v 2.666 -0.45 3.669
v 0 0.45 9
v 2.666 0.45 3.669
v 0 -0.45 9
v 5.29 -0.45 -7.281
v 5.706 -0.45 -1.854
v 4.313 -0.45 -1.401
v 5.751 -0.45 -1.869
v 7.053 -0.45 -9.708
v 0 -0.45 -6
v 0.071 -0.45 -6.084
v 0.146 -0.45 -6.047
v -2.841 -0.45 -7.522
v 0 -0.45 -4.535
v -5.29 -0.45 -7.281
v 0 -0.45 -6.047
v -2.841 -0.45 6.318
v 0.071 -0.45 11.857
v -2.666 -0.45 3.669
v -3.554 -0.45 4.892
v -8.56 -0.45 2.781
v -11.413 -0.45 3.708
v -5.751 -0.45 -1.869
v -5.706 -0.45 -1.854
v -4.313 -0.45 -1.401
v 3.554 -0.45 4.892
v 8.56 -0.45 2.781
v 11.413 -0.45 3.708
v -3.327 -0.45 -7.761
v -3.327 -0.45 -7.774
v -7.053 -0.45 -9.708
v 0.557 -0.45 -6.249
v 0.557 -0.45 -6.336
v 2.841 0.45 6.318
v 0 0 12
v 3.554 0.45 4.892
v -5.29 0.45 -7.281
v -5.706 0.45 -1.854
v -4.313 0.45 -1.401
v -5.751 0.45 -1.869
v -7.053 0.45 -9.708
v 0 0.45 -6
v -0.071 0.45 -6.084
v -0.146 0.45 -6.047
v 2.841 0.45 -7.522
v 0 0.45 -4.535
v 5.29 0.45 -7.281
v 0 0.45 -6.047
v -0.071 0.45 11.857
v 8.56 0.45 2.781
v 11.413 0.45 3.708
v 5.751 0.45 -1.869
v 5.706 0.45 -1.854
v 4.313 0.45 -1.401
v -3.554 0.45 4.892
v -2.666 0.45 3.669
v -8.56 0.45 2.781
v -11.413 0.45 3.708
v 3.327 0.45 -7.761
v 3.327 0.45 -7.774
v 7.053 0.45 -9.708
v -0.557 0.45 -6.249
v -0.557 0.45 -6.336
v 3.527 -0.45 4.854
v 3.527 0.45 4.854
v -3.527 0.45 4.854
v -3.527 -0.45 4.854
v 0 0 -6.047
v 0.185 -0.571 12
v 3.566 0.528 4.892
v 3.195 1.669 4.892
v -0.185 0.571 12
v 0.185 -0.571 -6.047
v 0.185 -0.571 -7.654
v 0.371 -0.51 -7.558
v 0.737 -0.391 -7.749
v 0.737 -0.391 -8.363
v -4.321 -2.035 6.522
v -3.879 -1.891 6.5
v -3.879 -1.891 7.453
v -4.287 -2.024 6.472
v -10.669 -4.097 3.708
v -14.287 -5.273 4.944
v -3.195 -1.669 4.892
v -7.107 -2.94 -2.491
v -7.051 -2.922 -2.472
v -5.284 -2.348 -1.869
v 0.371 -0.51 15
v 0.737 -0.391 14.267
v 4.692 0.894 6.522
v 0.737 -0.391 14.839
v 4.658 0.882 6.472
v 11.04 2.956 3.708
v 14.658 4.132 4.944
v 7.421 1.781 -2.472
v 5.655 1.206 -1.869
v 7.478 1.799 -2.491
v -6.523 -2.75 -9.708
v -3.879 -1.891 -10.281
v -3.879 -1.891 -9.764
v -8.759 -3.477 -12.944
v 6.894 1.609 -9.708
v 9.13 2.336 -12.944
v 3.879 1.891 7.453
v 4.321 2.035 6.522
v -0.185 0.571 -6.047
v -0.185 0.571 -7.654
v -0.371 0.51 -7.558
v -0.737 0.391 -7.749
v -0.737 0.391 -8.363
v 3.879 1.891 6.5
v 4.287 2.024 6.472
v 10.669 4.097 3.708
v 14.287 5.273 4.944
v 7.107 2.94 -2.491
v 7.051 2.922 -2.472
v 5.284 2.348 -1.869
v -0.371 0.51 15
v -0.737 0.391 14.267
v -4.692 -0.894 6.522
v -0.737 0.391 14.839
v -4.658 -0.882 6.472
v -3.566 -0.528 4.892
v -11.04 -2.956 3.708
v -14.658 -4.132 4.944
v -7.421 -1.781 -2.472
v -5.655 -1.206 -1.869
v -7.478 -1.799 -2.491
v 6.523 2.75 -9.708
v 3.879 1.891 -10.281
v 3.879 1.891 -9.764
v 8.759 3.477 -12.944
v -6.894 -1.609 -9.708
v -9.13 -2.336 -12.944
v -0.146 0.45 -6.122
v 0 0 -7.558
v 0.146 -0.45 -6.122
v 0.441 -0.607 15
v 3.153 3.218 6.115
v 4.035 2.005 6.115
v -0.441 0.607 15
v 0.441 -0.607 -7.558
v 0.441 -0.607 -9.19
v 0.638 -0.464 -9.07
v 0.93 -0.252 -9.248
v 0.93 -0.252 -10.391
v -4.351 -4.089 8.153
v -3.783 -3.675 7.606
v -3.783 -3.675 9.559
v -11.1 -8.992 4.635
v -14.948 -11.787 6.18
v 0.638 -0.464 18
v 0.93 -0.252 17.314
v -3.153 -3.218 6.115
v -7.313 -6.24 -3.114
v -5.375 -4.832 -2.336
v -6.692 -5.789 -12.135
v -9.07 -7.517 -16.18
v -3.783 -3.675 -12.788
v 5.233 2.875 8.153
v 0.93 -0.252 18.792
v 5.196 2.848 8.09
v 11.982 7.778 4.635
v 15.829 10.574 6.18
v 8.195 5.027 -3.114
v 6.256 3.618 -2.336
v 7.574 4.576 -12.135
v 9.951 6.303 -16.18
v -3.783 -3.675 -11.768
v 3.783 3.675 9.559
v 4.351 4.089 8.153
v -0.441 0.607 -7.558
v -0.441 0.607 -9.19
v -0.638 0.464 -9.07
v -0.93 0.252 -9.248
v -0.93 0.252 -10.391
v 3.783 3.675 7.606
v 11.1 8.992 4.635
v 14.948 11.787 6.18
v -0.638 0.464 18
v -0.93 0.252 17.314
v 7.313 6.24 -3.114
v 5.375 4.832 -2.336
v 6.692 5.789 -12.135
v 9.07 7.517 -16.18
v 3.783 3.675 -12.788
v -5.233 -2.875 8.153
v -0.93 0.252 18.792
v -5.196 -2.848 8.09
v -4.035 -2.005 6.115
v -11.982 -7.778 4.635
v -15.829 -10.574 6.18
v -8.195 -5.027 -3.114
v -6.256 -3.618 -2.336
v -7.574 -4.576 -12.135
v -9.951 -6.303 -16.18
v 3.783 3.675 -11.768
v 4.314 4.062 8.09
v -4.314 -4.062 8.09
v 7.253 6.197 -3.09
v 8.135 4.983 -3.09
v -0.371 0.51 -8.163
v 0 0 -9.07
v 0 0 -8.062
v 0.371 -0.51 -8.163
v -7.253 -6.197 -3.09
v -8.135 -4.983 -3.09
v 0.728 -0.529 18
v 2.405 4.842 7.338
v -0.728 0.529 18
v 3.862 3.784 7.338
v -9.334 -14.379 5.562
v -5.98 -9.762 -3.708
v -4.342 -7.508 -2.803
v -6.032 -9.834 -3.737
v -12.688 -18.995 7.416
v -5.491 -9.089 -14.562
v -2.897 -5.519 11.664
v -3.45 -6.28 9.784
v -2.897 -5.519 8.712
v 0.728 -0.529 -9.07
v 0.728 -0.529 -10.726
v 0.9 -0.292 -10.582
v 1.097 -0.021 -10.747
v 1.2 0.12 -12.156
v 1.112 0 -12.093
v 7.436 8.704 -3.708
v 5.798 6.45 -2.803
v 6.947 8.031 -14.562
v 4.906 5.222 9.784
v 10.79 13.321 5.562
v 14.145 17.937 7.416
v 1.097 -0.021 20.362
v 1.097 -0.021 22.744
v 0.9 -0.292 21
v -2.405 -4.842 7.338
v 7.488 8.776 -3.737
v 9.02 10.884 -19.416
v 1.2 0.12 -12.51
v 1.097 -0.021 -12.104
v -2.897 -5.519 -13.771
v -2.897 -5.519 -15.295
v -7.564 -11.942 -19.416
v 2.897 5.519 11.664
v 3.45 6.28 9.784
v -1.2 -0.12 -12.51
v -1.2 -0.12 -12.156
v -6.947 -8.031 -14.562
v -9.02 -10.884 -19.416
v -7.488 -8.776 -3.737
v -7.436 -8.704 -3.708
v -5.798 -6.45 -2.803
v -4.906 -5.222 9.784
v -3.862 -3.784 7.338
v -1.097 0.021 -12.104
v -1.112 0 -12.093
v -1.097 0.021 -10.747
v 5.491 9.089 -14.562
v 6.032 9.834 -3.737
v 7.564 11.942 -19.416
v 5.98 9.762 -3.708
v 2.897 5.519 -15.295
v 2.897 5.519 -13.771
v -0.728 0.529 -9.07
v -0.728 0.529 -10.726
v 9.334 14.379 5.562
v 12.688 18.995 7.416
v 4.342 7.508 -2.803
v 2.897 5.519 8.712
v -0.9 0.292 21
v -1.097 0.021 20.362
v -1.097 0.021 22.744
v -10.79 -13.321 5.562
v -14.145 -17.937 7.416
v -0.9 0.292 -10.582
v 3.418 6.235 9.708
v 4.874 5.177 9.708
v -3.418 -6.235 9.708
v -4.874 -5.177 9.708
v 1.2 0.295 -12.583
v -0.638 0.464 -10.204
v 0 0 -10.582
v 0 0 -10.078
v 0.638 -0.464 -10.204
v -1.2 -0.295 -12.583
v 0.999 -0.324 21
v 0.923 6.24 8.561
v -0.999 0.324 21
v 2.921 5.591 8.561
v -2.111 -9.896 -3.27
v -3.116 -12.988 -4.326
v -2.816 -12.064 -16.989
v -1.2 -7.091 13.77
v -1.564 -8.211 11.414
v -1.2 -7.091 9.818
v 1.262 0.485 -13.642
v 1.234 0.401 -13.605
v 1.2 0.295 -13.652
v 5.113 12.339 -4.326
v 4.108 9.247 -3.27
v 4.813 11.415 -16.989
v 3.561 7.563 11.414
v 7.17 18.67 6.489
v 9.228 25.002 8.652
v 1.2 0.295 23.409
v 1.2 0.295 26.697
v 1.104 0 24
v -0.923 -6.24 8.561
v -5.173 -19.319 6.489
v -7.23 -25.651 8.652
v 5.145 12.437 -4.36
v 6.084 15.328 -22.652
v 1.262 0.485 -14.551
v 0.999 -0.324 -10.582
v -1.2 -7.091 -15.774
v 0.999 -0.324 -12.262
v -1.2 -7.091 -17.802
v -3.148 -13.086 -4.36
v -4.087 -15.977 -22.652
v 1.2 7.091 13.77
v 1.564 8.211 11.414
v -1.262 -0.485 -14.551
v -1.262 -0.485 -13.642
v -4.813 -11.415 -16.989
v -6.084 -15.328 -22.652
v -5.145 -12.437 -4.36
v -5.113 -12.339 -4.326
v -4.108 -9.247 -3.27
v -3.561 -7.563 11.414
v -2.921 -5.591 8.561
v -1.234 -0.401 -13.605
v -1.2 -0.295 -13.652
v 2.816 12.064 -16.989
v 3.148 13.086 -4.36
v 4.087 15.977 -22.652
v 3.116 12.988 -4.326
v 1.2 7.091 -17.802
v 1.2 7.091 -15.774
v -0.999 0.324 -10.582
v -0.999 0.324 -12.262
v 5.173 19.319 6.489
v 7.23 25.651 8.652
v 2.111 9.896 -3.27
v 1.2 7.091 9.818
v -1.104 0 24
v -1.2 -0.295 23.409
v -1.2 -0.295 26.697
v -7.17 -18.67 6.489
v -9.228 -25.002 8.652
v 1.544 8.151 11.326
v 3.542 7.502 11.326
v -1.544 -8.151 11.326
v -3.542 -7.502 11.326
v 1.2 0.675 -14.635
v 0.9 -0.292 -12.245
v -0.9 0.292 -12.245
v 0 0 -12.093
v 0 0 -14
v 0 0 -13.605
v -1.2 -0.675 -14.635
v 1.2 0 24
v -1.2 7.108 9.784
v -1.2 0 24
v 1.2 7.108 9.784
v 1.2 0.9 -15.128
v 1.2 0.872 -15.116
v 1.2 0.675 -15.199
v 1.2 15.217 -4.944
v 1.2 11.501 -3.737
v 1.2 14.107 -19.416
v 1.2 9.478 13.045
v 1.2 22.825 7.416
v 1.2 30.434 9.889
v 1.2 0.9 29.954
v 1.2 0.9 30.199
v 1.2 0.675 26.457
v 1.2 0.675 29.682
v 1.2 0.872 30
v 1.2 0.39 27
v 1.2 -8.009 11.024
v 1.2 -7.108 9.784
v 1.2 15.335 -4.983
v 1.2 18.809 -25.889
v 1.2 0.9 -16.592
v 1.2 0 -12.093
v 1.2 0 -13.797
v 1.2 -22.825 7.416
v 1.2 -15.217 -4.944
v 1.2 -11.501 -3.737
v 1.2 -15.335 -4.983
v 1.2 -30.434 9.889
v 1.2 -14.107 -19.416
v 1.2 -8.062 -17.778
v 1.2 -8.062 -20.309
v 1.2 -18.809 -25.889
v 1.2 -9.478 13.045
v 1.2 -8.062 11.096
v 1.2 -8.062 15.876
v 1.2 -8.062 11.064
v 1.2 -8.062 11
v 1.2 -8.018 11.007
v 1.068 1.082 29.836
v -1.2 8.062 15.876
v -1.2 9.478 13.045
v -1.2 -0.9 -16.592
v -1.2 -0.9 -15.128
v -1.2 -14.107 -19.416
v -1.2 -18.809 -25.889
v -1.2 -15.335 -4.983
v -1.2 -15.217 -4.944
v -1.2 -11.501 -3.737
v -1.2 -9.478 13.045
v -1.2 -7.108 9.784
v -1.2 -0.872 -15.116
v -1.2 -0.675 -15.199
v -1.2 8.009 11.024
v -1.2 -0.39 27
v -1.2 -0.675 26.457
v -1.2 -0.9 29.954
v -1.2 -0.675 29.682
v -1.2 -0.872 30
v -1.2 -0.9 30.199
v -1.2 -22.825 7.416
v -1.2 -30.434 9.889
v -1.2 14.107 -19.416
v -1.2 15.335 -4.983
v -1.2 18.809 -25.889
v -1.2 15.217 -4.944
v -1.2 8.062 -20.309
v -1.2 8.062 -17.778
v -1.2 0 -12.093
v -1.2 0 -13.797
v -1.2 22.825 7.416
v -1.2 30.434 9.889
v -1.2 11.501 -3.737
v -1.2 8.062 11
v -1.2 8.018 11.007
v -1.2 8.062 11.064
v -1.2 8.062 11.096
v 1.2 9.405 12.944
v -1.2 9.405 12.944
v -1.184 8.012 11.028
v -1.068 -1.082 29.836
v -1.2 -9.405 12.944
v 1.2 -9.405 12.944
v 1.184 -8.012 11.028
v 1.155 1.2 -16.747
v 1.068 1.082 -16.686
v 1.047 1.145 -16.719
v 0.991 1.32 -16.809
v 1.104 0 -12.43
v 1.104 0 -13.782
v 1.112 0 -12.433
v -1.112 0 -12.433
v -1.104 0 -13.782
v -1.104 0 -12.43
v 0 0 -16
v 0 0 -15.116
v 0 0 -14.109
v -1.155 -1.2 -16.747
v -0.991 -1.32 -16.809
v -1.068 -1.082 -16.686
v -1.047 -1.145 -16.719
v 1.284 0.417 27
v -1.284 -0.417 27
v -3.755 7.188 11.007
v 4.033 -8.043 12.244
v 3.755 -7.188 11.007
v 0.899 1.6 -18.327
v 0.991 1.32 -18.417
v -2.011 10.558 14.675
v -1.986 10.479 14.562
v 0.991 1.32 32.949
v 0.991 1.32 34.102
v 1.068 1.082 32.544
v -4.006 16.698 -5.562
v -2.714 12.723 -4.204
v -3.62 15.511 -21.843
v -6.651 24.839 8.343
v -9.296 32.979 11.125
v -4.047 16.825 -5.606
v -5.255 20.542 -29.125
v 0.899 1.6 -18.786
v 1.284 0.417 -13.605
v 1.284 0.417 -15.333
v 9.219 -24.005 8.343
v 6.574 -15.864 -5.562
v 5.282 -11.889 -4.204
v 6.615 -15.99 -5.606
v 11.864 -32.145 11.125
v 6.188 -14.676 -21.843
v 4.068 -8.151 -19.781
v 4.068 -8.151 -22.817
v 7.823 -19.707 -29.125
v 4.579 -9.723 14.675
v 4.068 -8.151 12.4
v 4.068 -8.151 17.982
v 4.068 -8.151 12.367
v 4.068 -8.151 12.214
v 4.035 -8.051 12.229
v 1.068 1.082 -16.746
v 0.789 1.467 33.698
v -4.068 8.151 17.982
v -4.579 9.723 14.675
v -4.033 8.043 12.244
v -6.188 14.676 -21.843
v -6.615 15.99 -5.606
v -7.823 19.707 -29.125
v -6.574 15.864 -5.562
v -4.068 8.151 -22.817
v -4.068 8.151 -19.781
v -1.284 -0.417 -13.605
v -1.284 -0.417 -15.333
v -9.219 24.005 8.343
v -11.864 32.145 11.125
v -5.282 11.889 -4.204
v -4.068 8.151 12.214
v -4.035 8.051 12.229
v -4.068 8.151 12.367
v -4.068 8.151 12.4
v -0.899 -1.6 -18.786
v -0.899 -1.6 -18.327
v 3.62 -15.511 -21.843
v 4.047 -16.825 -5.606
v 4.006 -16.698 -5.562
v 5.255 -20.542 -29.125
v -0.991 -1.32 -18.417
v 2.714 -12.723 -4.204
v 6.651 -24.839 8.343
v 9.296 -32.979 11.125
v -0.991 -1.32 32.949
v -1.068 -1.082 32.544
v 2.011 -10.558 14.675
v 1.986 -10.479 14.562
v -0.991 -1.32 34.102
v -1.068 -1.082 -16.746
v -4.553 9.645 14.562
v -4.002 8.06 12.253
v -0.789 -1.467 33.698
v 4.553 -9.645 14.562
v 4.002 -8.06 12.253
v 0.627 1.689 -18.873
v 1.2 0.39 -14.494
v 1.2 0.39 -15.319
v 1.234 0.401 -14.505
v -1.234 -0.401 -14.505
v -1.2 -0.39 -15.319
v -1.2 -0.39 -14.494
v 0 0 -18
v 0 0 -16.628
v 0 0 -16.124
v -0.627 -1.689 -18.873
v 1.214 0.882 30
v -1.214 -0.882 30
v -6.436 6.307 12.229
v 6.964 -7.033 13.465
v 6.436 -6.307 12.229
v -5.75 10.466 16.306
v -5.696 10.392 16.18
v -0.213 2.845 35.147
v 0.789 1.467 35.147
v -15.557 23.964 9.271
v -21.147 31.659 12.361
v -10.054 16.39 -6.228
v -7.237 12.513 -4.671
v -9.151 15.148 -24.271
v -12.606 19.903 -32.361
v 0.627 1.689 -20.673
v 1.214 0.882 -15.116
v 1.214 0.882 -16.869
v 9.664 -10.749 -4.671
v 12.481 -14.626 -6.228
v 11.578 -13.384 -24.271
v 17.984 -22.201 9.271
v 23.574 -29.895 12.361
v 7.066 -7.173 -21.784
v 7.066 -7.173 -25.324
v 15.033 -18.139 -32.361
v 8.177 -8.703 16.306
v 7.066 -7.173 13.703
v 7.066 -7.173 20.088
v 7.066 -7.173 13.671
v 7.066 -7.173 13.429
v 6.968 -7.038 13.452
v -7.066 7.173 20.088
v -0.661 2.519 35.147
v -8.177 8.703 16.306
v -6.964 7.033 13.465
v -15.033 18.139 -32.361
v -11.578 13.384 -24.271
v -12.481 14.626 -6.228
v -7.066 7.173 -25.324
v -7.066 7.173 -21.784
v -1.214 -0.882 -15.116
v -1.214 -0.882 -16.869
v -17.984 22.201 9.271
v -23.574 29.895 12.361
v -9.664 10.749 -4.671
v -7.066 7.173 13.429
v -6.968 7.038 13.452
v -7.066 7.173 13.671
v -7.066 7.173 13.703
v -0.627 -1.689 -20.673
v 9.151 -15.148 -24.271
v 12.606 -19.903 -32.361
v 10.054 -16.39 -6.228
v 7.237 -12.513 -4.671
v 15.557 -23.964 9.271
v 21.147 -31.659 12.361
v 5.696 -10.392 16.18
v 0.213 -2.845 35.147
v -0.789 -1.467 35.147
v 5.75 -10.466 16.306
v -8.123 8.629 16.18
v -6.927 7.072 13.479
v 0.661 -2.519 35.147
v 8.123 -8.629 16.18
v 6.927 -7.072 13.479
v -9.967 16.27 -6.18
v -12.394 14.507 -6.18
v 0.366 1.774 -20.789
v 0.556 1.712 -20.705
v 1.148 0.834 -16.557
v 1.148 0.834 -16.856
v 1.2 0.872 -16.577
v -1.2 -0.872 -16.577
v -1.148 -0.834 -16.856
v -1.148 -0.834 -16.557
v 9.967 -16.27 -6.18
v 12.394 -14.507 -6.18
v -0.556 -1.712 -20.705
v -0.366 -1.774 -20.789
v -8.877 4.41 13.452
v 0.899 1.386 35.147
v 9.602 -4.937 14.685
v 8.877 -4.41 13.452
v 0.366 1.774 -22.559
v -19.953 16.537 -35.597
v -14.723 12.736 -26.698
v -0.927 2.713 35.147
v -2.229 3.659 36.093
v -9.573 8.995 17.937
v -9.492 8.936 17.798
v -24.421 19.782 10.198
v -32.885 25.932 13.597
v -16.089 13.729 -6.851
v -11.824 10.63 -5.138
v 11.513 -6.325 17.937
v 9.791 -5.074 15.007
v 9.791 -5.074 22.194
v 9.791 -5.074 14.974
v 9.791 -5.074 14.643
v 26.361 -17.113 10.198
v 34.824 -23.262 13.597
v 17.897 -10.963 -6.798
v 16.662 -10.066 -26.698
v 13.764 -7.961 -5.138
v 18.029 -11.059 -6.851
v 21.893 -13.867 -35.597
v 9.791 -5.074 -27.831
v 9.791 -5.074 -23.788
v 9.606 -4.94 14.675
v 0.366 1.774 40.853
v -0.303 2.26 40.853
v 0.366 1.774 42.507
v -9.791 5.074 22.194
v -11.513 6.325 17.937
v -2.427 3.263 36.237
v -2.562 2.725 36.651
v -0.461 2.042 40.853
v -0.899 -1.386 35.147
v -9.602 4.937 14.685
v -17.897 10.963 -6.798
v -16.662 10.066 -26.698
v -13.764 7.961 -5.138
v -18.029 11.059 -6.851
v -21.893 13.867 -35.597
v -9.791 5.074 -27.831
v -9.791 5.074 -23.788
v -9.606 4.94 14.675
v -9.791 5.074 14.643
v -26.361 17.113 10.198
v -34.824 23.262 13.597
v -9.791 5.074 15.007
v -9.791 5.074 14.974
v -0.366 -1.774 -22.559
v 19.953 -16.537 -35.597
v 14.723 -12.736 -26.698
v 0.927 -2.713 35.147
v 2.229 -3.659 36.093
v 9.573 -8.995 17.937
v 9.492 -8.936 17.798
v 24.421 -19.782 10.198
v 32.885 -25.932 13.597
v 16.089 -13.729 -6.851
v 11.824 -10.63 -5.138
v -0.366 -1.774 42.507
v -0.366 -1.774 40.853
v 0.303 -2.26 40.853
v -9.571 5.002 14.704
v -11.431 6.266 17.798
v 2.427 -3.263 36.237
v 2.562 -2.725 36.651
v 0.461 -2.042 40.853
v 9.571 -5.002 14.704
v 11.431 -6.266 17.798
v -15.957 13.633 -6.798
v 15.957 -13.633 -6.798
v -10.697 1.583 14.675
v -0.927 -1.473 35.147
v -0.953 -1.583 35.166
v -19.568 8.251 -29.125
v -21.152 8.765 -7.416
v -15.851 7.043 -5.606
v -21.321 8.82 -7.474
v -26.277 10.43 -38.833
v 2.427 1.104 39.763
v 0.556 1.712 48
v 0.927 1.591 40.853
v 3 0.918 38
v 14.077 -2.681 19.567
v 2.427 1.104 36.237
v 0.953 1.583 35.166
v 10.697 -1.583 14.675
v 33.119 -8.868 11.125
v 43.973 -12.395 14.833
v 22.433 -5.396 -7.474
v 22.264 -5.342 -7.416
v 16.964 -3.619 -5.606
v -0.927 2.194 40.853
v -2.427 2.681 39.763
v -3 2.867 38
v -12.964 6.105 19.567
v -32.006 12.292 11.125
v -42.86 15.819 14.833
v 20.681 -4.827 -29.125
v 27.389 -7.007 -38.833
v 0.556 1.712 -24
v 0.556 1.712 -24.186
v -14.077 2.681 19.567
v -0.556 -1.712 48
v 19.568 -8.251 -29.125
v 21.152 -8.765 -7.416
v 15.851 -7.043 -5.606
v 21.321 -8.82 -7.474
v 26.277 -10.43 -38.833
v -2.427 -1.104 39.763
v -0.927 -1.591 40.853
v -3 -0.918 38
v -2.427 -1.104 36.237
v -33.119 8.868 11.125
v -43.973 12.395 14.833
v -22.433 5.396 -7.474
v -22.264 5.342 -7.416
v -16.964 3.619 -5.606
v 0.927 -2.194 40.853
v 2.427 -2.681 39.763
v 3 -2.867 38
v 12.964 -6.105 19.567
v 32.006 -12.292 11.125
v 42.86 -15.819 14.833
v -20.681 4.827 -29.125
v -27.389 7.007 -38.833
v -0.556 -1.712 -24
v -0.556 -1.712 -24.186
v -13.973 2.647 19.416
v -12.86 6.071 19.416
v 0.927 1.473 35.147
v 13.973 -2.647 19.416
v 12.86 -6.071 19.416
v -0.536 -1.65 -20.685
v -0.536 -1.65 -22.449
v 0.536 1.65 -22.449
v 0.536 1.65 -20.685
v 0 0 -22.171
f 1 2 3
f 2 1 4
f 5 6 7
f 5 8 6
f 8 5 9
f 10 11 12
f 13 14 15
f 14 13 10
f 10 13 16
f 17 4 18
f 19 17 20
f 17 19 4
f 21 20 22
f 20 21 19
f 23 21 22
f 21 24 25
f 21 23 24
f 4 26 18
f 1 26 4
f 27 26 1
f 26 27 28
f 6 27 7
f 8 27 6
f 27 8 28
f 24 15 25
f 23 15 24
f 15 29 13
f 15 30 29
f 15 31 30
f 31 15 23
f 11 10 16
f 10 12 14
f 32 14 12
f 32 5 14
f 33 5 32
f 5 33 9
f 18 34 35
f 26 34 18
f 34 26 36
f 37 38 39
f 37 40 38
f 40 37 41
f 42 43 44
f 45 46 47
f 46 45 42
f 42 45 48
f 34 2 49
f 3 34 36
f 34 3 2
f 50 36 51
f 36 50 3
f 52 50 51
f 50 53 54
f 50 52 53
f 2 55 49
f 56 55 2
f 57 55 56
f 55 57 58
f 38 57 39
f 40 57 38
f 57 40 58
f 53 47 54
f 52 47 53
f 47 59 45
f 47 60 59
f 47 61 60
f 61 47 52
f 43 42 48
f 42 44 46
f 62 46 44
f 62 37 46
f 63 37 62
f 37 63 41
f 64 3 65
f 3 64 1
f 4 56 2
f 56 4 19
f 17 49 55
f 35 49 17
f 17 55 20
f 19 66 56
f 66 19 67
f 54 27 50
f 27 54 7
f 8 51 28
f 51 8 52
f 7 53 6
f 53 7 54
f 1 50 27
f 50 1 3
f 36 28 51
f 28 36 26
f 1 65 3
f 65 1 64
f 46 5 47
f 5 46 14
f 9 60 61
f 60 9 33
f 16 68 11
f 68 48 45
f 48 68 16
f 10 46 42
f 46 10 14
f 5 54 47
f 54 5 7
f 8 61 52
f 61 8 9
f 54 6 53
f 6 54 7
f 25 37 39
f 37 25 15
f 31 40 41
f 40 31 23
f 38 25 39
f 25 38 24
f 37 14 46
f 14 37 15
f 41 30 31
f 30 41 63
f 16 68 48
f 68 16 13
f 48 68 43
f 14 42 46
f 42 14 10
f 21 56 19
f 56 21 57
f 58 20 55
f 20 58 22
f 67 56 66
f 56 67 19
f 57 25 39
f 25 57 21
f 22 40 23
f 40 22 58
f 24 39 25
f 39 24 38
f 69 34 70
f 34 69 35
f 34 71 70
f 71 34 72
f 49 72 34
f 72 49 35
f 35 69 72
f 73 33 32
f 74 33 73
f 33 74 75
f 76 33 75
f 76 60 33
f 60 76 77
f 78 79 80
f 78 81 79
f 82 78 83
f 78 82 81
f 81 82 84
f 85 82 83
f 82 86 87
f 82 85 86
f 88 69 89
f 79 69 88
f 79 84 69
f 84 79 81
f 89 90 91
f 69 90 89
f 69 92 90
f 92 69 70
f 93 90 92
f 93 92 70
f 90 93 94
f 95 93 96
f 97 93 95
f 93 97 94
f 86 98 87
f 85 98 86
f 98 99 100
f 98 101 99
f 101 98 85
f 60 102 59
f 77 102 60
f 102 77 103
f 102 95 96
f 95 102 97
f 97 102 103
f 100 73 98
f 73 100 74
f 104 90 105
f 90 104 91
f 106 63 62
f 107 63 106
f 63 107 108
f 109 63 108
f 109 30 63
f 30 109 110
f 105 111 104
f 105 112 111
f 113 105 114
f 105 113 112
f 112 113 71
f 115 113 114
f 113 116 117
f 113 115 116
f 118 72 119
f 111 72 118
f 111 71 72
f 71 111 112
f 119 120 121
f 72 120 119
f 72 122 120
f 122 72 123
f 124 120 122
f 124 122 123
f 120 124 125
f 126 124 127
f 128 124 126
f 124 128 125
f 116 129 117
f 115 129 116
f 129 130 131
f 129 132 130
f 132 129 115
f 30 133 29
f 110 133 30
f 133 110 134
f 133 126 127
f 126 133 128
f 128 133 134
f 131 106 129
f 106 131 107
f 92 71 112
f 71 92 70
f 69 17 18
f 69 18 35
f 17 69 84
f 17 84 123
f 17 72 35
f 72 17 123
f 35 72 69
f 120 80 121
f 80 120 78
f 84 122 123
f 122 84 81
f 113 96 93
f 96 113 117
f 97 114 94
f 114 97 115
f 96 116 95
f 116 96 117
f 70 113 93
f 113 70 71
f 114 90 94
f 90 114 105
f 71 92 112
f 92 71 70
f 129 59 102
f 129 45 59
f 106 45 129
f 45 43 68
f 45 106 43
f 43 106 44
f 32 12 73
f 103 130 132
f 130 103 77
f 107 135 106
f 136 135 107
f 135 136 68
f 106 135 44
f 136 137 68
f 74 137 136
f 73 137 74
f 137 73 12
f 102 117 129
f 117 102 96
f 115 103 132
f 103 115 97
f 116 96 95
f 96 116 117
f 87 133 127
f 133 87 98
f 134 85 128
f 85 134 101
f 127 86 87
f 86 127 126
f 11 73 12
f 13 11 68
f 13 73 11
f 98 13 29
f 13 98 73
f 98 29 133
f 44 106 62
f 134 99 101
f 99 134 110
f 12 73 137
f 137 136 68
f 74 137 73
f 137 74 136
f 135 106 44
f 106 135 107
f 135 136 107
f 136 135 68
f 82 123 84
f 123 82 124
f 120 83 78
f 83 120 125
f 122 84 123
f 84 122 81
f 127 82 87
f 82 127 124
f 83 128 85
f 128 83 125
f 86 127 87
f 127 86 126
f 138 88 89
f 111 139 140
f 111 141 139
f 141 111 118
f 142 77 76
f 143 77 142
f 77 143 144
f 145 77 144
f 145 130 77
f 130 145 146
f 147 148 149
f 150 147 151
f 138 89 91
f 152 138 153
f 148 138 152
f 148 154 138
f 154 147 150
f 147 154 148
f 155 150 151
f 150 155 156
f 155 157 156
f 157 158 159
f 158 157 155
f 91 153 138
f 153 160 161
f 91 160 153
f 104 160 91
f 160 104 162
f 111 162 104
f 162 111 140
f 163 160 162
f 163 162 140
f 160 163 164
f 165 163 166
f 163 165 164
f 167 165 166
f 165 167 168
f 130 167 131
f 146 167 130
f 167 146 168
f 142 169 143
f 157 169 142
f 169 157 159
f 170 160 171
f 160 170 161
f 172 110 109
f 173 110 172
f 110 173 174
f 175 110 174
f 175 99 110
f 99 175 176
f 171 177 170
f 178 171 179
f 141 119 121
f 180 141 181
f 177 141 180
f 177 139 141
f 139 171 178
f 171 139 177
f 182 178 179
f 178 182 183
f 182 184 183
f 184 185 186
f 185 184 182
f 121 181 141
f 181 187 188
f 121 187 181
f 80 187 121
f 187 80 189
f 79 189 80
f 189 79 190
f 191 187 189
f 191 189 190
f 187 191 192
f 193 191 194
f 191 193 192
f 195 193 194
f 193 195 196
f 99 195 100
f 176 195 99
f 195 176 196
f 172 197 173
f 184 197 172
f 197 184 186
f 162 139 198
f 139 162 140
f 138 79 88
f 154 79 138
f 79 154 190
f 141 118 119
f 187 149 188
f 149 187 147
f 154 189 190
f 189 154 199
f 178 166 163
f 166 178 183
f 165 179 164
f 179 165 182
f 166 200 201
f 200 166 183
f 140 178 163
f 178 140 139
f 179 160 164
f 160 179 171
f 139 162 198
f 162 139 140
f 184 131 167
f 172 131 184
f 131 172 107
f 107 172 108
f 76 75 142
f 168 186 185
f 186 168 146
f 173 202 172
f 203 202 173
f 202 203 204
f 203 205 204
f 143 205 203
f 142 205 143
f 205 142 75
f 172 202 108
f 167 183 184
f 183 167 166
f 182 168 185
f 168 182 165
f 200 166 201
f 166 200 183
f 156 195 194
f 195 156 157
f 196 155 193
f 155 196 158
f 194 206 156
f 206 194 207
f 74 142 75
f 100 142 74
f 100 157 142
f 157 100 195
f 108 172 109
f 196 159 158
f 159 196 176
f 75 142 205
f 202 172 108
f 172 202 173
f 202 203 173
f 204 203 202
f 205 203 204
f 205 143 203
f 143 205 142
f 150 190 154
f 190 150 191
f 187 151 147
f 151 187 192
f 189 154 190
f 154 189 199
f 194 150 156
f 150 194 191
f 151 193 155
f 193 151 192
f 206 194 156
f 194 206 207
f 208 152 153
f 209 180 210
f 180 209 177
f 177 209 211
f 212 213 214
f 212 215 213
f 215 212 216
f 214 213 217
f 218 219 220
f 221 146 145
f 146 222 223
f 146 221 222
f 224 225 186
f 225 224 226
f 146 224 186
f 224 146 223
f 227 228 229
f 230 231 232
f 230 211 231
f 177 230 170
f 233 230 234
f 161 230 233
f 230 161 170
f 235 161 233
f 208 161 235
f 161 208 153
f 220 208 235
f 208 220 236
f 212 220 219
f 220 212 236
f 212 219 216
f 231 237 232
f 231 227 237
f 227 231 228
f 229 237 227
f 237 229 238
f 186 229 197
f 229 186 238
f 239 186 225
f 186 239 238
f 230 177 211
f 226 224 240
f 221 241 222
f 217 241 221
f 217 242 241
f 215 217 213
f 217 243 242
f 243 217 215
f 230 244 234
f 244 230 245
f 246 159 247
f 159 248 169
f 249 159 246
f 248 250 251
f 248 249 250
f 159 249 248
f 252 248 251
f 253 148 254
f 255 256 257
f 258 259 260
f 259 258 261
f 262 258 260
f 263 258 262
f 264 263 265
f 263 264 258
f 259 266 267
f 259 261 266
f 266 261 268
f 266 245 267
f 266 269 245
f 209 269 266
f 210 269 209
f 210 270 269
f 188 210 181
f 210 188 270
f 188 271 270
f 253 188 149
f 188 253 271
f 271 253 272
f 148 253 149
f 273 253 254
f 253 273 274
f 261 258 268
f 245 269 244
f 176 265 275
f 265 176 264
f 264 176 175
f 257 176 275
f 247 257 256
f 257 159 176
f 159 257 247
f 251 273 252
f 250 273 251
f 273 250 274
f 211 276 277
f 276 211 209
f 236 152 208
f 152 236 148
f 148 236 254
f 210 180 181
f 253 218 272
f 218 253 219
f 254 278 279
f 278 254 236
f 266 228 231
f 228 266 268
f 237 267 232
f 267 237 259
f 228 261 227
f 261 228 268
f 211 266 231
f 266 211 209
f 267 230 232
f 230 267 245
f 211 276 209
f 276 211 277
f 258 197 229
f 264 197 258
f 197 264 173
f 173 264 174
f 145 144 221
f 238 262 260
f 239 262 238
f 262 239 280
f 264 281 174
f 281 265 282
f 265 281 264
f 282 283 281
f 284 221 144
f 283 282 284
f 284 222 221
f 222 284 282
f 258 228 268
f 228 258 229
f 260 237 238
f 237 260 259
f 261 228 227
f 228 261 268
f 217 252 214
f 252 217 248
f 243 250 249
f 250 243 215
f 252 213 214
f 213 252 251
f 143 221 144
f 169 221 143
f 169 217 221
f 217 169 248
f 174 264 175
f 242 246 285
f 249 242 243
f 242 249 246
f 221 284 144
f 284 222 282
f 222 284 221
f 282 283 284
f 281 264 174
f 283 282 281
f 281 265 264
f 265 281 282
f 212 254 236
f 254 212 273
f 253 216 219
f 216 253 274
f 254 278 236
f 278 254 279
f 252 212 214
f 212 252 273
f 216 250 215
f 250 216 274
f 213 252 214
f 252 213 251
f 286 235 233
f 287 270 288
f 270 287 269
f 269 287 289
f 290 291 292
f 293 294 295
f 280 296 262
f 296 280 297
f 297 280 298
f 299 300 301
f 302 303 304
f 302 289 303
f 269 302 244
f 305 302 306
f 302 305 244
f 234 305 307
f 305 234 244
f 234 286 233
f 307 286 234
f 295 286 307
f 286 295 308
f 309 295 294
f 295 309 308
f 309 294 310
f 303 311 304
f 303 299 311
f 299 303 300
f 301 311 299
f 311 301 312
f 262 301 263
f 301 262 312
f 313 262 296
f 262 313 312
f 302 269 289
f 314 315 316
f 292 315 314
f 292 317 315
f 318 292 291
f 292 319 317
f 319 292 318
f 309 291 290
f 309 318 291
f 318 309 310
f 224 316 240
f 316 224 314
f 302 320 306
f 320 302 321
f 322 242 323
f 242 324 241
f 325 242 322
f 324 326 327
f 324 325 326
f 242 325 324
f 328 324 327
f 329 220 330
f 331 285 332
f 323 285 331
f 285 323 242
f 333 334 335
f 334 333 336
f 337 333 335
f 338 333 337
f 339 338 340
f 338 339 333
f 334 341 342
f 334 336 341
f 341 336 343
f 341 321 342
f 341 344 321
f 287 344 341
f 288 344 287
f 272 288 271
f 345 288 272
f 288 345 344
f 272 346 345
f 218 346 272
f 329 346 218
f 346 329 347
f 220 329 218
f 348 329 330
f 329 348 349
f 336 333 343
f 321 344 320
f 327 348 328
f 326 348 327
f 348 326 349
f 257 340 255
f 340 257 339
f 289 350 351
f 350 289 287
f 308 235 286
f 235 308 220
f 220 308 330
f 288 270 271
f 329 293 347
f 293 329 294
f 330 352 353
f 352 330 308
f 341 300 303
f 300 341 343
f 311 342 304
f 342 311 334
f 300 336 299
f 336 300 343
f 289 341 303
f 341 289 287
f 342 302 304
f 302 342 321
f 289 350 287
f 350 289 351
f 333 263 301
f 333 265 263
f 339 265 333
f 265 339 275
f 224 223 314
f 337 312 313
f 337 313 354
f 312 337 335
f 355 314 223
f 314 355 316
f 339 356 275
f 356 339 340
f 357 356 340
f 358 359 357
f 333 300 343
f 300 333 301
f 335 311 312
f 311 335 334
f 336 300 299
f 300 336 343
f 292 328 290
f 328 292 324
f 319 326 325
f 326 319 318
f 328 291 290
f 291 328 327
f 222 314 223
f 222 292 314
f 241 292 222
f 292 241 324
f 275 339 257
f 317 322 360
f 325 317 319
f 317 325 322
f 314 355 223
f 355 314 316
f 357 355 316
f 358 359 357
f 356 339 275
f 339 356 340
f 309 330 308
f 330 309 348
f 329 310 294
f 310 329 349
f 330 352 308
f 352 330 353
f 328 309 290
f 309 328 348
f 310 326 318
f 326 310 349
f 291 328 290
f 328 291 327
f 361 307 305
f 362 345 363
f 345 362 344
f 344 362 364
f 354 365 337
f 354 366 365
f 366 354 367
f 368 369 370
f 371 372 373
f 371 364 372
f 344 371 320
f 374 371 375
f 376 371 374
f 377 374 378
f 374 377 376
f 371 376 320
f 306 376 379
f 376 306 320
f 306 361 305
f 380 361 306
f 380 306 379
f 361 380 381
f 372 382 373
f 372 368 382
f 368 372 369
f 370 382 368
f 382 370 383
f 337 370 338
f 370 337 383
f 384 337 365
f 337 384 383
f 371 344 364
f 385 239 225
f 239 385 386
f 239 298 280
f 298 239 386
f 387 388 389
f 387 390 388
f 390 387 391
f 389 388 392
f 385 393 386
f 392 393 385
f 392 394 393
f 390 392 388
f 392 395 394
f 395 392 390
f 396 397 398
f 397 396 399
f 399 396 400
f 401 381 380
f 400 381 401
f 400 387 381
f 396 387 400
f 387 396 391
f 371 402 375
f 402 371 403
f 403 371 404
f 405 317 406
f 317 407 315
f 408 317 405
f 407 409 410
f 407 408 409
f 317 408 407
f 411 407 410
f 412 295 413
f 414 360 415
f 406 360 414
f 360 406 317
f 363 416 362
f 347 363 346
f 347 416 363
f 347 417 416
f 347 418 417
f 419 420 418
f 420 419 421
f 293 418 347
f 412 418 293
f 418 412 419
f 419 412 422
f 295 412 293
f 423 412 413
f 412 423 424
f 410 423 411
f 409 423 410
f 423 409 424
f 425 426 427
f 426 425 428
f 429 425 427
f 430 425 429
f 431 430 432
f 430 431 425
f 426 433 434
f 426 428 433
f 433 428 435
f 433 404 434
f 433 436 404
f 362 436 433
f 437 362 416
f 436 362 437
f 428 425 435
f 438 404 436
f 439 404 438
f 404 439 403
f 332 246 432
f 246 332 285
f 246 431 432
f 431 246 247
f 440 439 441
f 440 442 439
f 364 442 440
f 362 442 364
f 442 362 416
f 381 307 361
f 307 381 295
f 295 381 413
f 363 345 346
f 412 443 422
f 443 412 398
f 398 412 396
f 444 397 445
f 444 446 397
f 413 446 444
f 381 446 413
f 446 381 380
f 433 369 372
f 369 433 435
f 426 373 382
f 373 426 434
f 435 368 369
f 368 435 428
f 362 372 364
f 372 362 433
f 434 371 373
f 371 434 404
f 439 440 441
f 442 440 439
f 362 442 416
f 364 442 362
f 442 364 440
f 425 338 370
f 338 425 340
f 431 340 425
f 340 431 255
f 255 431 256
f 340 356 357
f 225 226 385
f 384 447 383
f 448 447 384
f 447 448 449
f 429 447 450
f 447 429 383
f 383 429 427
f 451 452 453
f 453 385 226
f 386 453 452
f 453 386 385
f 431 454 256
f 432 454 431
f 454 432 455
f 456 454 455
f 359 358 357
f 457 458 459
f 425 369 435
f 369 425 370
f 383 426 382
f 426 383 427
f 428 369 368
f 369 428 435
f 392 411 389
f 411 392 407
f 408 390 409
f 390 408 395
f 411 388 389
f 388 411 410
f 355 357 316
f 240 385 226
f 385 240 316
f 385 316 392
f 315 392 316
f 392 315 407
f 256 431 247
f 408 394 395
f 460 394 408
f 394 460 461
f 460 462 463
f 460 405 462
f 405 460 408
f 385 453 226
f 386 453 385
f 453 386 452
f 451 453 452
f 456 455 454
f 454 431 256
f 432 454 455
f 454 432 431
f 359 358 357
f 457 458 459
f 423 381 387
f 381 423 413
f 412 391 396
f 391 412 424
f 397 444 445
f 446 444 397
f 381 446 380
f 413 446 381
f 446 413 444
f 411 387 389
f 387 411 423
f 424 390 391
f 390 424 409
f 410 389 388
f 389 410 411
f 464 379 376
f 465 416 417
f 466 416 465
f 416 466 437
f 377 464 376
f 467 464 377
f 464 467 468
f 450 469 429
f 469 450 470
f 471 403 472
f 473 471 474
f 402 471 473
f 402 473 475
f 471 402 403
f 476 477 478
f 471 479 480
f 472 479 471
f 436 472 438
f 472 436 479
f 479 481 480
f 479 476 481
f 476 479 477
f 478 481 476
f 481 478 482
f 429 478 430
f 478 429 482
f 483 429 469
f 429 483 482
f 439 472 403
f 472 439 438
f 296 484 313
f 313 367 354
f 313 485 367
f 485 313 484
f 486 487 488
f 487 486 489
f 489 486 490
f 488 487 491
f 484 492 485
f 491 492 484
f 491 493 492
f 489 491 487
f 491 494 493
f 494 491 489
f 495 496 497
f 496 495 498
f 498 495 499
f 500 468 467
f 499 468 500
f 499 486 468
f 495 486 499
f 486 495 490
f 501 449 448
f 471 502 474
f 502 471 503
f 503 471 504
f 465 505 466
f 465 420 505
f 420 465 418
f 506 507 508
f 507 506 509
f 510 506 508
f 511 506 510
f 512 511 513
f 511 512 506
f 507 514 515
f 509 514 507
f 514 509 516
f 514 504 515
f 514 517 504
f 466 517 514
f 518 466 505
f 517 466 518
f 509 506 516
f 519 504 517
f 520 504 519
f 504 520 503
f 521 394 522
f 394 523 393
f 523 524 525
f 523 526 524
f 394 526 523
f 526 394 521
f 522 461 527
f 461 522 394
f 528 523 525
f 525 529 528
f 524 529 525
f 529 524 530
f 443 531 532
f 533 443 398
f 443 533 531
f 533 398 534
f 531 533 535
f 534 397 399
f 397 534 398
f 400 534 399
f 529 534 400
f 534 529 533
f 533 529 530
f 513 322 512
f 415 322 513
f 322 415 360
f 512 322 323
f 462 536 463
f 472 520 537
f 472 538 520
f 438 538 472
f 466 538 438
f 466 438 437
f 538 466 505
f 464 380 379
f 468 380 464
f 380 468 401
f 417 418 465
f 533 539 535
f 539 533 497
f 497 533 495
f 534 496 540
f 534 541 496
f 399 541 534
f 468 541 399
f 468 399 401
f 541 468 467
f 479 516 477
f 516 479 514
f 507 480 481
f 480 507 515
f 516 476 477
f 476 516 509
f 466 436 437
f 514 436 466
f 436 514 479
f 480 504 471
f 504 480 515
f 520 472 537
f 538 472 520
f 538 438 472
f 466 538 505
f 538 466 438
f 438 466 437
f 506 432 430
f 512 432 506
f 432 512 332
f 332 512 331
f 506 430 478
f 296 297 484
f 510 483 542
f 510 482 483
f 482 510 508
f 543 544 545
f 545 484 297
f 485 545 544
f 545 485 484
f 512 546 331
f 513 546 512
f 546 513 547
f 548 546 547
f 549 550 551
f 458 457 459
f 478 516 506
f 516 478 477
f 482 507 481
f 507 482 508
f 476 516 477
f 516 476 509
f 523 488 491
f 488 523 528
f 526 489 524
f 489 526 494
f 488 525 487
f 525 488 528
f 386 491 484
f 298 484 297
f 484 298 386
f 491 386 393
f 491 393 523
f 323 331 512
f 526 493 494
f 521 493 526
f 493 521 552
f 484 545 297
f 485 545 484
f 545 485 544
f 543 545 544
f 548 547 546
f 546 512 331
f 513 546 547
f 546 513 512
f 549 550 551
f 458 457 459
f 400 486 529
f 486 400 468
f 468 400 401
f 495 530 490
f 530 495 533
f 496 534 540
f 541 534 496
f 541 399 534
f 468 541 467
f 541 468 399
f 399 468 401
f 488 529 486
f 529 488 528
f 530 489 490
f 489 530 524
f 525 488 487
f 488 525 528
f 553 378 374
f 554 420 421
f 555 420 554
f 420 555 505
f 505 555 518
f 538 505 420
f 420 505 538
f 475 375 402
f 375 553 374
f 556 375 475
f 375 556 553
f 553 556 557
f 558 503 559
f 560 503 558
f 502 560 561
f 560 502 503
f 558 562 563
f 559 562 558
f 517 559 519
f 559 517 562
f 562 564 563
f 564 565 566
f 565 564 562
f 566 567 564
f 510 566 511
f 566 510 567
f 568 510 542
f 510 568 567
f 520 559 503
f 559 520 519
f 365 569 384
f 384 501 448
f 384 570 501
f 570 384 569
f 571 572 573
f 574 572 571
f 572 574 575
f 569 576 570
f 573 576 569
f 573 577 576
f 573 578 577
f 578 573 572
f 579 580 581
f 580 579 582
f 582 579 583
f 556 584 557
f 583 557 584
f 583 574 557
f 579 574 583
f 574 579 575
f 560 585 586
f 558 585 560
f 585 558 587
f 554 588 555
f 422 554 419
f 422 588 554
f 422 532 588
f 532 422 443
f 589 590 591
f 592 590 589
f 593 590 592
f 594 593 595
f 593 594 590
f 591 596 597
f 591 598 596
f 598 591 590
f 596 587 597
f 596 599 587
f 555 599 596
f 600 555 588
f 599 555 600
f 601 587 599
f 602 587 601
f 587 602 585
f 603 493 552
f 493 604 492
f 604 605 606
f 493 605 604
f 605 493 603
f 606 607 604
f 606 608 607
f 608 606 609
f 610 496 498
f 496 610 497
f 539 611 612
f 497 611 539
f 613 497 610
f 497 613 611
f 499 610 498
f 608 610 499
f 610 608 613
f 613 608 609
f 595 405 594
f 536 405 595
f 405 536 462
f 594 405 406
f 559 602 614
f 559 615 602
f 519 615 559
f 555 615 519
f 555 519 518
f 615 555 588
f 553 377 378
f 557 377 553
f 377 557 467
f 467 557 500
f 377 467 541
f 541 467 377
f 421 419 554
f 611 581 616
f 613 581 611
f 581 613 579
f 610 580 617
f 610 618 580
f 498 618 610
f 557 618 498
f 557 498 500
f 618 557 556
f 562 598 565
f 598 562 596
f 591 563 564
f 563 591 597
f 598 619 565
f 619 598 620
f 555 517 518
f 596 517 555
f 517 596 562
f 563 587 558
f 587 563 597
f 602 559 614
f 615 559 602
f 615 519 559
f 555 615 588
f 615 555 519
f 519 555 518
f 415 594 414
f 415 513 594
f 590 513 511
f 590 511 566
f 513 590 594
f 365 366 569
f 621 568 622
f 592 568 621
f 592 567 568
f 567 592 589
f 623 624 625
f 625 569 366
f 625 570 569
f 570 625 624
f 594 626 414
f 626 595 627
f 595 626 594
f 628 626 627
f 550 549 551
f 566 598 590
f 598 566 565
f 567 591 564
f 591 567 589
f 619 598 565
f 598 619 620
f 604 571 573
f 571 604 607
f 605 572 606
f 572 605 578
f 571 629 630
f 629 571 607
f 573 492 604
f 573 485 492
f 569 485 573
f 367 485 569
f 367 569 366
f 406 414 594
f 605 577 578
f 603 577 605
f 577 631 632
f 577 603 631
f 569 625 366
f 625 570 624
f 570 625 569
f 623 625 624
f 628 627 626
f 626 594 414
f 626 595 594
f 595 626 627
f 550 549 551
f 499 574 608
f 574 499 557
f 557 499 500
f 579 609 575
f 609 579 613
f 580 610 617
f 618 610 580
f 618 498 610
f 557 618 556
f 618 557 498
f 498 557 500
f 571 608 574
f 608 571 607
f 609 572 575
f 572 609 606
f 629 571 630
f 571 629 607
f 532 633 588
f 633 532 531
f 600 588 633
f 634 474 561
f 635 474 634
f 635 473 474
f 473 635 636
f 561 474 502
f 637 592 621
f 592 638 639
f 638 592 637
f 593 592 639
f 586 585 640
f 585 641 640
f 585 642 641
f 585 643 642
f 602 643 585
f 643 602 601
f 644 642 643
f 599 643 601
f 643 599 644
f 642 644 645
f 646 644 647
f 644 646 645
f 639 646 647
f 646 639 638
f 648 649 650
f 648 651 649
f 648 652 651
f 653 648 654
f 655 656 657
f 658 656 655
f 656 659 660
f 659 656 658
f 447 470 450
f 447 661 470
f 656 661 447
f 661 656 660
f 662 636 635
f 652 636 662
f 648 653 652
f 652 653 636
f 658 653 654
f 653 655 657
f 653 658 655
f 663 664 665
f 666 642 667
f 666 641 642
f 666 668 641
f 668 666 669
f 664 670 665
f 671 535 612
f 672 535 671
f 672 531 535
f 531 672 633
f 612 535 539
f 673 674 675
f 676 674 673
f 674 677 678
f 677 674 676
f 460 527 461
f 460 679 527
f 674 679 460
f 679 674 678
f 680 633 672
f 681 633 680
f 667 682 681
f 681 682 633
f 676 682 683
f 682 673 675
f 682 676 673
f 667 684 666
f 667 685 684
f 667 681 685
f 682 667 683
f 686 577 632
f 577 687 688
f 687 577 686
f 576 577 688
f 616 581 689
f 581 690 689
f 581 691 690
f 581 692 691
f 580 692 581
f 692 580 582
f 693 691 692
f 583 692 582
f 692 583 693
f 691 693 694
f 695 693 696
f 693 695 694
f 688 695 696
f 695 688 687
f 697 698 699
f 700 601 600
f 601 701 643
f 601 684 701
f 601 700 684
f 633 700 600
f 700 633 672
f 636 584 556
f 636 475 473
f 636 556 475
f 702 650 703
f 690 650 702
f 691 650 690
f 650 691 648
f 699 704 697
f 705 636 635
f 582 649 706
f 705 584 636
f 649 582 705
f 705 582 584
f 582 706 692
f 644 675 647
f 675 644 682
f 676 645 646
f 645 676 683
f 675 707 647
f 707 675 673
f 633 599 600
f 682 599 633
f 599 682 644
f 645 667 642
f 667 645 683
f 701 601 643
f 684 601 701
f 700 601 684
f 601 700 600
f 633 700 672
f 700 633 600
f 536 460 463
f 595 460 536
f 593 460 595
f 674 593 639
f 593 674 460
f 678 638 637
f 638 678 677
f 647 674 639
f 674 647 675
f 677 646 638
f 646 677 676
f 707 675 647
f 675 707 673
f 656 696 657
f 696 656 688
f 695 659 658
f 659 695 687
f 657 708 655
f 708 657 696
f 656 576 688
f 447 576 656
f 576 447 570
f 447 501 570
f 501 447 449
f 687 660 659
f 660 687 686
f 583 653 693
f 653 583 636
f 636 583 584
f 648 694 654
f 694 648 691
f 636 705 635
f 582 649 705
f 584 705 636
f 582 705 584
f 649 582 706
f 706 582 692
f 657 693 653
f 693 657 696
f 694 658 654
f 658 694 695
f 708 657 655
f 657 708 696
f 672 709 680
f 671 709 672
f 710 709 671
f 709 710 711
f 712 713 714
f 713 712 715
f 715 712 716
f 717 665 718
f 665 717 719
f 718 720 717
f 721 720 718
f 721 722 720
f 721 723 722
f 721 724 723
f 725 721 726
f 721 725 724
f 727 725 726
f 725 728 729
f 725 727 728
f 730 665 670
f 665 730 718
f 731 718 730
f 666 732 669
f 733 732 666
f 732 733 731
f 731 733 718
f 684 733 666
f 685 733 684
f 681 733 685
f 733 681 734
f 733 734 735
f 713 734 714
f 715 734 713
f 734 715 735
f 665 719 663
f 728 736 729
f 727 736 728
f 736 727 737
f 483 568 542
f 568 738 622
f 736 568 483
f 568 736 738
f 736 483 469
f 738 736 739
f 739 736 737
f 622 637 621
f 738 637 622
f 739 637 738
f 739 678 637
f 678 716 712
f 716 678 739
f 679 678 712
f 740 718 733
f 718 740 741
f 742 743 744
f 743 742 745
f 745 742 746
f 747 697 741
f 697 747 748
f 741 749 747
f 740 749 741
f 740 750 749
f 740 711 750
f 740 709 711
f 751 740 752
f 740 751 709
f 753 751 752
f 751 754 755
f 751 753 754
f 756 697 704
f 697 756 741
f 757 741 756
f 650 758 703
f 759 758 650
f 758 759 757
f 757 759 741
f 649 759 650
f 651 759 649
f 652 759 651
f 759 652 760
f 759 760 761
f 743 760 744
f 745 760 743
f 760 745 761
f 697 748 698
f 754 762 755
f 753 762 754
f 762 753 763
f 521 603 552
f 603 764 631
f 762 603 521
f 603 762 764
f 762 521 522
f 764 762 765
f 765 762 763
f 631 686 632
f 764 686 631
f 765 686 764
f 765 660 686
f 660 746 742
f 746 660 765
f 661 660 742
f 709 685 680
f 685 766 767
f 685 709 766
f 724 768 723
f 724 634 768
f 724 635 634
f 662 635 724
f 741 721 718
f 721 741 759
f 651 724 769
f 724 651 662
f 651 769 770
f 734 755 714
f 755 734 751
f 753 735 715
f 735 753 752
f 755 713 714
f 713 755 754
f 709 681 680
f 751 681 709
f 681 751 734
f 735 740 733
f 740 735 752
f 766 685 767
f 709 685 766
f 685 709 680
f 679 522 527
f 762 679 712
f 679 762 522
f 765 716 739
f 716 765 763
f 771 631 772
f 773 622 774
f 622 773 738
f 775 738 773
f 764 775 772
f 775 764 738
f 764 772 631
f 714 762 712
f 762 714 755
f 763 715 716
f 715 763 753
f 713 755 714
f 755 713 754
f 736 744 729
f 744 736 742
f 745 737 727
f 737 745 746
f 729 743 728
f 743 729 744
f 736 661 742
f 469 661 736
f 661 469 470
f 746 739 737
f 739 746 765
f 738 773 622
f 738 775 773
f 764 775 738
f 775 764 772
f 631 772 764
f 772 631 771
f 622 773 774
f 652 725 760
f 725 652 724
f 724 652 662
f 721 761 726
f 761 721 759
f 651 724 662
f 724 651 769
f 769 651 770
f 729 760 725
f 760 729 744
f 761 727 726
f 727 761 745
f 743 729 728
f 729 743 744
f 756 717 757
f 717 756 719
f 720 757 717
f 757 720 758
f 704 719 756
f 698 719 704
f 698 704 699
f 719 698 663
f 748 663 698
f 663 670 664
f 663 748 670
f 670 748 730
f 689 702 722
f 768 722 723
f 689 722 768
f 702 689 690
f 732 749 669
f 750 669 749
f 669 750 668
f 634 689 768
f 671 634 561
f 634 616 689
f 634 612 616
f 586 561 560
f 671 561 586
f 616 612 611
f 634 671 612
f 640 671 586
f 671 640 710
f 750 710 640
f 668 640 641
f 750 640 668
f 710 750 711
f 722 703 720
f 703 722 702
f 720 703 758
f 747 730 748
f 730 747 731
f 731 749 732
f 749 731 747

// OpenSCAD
module baseline(n) {
    difference() {
        rotate([90,0,0])
        linear_extrude(height = 3, center=true)
        polygon(points=[[0,30],[0,40],[20,0],[20,-10]]);
        translate([0,-2.5,0])
        rotate([0,360/n/2,0])        
        cube([30,5,20]);
    }
}

module tip(n) {
    union() {
        baseline(n);
        mirror([1,0,0])
            baseline(n);
    }
}

module star() {
n = 5;
for(i=[0:n-1]) {
    rotate([0,i*360/n,0])
        tip(n);
}
}

difference() {
    union(){
        m = 10;
        for(i=[0:m-1]) {
            rotate([0,0,i*180/m])
            scale([i/m+.3,i/m+.3,i/m+.3])
                star();
        }
    }
    translate([0,5,38])
    rotate([90,0,0])
    #cylinder(10,3,3);
}
